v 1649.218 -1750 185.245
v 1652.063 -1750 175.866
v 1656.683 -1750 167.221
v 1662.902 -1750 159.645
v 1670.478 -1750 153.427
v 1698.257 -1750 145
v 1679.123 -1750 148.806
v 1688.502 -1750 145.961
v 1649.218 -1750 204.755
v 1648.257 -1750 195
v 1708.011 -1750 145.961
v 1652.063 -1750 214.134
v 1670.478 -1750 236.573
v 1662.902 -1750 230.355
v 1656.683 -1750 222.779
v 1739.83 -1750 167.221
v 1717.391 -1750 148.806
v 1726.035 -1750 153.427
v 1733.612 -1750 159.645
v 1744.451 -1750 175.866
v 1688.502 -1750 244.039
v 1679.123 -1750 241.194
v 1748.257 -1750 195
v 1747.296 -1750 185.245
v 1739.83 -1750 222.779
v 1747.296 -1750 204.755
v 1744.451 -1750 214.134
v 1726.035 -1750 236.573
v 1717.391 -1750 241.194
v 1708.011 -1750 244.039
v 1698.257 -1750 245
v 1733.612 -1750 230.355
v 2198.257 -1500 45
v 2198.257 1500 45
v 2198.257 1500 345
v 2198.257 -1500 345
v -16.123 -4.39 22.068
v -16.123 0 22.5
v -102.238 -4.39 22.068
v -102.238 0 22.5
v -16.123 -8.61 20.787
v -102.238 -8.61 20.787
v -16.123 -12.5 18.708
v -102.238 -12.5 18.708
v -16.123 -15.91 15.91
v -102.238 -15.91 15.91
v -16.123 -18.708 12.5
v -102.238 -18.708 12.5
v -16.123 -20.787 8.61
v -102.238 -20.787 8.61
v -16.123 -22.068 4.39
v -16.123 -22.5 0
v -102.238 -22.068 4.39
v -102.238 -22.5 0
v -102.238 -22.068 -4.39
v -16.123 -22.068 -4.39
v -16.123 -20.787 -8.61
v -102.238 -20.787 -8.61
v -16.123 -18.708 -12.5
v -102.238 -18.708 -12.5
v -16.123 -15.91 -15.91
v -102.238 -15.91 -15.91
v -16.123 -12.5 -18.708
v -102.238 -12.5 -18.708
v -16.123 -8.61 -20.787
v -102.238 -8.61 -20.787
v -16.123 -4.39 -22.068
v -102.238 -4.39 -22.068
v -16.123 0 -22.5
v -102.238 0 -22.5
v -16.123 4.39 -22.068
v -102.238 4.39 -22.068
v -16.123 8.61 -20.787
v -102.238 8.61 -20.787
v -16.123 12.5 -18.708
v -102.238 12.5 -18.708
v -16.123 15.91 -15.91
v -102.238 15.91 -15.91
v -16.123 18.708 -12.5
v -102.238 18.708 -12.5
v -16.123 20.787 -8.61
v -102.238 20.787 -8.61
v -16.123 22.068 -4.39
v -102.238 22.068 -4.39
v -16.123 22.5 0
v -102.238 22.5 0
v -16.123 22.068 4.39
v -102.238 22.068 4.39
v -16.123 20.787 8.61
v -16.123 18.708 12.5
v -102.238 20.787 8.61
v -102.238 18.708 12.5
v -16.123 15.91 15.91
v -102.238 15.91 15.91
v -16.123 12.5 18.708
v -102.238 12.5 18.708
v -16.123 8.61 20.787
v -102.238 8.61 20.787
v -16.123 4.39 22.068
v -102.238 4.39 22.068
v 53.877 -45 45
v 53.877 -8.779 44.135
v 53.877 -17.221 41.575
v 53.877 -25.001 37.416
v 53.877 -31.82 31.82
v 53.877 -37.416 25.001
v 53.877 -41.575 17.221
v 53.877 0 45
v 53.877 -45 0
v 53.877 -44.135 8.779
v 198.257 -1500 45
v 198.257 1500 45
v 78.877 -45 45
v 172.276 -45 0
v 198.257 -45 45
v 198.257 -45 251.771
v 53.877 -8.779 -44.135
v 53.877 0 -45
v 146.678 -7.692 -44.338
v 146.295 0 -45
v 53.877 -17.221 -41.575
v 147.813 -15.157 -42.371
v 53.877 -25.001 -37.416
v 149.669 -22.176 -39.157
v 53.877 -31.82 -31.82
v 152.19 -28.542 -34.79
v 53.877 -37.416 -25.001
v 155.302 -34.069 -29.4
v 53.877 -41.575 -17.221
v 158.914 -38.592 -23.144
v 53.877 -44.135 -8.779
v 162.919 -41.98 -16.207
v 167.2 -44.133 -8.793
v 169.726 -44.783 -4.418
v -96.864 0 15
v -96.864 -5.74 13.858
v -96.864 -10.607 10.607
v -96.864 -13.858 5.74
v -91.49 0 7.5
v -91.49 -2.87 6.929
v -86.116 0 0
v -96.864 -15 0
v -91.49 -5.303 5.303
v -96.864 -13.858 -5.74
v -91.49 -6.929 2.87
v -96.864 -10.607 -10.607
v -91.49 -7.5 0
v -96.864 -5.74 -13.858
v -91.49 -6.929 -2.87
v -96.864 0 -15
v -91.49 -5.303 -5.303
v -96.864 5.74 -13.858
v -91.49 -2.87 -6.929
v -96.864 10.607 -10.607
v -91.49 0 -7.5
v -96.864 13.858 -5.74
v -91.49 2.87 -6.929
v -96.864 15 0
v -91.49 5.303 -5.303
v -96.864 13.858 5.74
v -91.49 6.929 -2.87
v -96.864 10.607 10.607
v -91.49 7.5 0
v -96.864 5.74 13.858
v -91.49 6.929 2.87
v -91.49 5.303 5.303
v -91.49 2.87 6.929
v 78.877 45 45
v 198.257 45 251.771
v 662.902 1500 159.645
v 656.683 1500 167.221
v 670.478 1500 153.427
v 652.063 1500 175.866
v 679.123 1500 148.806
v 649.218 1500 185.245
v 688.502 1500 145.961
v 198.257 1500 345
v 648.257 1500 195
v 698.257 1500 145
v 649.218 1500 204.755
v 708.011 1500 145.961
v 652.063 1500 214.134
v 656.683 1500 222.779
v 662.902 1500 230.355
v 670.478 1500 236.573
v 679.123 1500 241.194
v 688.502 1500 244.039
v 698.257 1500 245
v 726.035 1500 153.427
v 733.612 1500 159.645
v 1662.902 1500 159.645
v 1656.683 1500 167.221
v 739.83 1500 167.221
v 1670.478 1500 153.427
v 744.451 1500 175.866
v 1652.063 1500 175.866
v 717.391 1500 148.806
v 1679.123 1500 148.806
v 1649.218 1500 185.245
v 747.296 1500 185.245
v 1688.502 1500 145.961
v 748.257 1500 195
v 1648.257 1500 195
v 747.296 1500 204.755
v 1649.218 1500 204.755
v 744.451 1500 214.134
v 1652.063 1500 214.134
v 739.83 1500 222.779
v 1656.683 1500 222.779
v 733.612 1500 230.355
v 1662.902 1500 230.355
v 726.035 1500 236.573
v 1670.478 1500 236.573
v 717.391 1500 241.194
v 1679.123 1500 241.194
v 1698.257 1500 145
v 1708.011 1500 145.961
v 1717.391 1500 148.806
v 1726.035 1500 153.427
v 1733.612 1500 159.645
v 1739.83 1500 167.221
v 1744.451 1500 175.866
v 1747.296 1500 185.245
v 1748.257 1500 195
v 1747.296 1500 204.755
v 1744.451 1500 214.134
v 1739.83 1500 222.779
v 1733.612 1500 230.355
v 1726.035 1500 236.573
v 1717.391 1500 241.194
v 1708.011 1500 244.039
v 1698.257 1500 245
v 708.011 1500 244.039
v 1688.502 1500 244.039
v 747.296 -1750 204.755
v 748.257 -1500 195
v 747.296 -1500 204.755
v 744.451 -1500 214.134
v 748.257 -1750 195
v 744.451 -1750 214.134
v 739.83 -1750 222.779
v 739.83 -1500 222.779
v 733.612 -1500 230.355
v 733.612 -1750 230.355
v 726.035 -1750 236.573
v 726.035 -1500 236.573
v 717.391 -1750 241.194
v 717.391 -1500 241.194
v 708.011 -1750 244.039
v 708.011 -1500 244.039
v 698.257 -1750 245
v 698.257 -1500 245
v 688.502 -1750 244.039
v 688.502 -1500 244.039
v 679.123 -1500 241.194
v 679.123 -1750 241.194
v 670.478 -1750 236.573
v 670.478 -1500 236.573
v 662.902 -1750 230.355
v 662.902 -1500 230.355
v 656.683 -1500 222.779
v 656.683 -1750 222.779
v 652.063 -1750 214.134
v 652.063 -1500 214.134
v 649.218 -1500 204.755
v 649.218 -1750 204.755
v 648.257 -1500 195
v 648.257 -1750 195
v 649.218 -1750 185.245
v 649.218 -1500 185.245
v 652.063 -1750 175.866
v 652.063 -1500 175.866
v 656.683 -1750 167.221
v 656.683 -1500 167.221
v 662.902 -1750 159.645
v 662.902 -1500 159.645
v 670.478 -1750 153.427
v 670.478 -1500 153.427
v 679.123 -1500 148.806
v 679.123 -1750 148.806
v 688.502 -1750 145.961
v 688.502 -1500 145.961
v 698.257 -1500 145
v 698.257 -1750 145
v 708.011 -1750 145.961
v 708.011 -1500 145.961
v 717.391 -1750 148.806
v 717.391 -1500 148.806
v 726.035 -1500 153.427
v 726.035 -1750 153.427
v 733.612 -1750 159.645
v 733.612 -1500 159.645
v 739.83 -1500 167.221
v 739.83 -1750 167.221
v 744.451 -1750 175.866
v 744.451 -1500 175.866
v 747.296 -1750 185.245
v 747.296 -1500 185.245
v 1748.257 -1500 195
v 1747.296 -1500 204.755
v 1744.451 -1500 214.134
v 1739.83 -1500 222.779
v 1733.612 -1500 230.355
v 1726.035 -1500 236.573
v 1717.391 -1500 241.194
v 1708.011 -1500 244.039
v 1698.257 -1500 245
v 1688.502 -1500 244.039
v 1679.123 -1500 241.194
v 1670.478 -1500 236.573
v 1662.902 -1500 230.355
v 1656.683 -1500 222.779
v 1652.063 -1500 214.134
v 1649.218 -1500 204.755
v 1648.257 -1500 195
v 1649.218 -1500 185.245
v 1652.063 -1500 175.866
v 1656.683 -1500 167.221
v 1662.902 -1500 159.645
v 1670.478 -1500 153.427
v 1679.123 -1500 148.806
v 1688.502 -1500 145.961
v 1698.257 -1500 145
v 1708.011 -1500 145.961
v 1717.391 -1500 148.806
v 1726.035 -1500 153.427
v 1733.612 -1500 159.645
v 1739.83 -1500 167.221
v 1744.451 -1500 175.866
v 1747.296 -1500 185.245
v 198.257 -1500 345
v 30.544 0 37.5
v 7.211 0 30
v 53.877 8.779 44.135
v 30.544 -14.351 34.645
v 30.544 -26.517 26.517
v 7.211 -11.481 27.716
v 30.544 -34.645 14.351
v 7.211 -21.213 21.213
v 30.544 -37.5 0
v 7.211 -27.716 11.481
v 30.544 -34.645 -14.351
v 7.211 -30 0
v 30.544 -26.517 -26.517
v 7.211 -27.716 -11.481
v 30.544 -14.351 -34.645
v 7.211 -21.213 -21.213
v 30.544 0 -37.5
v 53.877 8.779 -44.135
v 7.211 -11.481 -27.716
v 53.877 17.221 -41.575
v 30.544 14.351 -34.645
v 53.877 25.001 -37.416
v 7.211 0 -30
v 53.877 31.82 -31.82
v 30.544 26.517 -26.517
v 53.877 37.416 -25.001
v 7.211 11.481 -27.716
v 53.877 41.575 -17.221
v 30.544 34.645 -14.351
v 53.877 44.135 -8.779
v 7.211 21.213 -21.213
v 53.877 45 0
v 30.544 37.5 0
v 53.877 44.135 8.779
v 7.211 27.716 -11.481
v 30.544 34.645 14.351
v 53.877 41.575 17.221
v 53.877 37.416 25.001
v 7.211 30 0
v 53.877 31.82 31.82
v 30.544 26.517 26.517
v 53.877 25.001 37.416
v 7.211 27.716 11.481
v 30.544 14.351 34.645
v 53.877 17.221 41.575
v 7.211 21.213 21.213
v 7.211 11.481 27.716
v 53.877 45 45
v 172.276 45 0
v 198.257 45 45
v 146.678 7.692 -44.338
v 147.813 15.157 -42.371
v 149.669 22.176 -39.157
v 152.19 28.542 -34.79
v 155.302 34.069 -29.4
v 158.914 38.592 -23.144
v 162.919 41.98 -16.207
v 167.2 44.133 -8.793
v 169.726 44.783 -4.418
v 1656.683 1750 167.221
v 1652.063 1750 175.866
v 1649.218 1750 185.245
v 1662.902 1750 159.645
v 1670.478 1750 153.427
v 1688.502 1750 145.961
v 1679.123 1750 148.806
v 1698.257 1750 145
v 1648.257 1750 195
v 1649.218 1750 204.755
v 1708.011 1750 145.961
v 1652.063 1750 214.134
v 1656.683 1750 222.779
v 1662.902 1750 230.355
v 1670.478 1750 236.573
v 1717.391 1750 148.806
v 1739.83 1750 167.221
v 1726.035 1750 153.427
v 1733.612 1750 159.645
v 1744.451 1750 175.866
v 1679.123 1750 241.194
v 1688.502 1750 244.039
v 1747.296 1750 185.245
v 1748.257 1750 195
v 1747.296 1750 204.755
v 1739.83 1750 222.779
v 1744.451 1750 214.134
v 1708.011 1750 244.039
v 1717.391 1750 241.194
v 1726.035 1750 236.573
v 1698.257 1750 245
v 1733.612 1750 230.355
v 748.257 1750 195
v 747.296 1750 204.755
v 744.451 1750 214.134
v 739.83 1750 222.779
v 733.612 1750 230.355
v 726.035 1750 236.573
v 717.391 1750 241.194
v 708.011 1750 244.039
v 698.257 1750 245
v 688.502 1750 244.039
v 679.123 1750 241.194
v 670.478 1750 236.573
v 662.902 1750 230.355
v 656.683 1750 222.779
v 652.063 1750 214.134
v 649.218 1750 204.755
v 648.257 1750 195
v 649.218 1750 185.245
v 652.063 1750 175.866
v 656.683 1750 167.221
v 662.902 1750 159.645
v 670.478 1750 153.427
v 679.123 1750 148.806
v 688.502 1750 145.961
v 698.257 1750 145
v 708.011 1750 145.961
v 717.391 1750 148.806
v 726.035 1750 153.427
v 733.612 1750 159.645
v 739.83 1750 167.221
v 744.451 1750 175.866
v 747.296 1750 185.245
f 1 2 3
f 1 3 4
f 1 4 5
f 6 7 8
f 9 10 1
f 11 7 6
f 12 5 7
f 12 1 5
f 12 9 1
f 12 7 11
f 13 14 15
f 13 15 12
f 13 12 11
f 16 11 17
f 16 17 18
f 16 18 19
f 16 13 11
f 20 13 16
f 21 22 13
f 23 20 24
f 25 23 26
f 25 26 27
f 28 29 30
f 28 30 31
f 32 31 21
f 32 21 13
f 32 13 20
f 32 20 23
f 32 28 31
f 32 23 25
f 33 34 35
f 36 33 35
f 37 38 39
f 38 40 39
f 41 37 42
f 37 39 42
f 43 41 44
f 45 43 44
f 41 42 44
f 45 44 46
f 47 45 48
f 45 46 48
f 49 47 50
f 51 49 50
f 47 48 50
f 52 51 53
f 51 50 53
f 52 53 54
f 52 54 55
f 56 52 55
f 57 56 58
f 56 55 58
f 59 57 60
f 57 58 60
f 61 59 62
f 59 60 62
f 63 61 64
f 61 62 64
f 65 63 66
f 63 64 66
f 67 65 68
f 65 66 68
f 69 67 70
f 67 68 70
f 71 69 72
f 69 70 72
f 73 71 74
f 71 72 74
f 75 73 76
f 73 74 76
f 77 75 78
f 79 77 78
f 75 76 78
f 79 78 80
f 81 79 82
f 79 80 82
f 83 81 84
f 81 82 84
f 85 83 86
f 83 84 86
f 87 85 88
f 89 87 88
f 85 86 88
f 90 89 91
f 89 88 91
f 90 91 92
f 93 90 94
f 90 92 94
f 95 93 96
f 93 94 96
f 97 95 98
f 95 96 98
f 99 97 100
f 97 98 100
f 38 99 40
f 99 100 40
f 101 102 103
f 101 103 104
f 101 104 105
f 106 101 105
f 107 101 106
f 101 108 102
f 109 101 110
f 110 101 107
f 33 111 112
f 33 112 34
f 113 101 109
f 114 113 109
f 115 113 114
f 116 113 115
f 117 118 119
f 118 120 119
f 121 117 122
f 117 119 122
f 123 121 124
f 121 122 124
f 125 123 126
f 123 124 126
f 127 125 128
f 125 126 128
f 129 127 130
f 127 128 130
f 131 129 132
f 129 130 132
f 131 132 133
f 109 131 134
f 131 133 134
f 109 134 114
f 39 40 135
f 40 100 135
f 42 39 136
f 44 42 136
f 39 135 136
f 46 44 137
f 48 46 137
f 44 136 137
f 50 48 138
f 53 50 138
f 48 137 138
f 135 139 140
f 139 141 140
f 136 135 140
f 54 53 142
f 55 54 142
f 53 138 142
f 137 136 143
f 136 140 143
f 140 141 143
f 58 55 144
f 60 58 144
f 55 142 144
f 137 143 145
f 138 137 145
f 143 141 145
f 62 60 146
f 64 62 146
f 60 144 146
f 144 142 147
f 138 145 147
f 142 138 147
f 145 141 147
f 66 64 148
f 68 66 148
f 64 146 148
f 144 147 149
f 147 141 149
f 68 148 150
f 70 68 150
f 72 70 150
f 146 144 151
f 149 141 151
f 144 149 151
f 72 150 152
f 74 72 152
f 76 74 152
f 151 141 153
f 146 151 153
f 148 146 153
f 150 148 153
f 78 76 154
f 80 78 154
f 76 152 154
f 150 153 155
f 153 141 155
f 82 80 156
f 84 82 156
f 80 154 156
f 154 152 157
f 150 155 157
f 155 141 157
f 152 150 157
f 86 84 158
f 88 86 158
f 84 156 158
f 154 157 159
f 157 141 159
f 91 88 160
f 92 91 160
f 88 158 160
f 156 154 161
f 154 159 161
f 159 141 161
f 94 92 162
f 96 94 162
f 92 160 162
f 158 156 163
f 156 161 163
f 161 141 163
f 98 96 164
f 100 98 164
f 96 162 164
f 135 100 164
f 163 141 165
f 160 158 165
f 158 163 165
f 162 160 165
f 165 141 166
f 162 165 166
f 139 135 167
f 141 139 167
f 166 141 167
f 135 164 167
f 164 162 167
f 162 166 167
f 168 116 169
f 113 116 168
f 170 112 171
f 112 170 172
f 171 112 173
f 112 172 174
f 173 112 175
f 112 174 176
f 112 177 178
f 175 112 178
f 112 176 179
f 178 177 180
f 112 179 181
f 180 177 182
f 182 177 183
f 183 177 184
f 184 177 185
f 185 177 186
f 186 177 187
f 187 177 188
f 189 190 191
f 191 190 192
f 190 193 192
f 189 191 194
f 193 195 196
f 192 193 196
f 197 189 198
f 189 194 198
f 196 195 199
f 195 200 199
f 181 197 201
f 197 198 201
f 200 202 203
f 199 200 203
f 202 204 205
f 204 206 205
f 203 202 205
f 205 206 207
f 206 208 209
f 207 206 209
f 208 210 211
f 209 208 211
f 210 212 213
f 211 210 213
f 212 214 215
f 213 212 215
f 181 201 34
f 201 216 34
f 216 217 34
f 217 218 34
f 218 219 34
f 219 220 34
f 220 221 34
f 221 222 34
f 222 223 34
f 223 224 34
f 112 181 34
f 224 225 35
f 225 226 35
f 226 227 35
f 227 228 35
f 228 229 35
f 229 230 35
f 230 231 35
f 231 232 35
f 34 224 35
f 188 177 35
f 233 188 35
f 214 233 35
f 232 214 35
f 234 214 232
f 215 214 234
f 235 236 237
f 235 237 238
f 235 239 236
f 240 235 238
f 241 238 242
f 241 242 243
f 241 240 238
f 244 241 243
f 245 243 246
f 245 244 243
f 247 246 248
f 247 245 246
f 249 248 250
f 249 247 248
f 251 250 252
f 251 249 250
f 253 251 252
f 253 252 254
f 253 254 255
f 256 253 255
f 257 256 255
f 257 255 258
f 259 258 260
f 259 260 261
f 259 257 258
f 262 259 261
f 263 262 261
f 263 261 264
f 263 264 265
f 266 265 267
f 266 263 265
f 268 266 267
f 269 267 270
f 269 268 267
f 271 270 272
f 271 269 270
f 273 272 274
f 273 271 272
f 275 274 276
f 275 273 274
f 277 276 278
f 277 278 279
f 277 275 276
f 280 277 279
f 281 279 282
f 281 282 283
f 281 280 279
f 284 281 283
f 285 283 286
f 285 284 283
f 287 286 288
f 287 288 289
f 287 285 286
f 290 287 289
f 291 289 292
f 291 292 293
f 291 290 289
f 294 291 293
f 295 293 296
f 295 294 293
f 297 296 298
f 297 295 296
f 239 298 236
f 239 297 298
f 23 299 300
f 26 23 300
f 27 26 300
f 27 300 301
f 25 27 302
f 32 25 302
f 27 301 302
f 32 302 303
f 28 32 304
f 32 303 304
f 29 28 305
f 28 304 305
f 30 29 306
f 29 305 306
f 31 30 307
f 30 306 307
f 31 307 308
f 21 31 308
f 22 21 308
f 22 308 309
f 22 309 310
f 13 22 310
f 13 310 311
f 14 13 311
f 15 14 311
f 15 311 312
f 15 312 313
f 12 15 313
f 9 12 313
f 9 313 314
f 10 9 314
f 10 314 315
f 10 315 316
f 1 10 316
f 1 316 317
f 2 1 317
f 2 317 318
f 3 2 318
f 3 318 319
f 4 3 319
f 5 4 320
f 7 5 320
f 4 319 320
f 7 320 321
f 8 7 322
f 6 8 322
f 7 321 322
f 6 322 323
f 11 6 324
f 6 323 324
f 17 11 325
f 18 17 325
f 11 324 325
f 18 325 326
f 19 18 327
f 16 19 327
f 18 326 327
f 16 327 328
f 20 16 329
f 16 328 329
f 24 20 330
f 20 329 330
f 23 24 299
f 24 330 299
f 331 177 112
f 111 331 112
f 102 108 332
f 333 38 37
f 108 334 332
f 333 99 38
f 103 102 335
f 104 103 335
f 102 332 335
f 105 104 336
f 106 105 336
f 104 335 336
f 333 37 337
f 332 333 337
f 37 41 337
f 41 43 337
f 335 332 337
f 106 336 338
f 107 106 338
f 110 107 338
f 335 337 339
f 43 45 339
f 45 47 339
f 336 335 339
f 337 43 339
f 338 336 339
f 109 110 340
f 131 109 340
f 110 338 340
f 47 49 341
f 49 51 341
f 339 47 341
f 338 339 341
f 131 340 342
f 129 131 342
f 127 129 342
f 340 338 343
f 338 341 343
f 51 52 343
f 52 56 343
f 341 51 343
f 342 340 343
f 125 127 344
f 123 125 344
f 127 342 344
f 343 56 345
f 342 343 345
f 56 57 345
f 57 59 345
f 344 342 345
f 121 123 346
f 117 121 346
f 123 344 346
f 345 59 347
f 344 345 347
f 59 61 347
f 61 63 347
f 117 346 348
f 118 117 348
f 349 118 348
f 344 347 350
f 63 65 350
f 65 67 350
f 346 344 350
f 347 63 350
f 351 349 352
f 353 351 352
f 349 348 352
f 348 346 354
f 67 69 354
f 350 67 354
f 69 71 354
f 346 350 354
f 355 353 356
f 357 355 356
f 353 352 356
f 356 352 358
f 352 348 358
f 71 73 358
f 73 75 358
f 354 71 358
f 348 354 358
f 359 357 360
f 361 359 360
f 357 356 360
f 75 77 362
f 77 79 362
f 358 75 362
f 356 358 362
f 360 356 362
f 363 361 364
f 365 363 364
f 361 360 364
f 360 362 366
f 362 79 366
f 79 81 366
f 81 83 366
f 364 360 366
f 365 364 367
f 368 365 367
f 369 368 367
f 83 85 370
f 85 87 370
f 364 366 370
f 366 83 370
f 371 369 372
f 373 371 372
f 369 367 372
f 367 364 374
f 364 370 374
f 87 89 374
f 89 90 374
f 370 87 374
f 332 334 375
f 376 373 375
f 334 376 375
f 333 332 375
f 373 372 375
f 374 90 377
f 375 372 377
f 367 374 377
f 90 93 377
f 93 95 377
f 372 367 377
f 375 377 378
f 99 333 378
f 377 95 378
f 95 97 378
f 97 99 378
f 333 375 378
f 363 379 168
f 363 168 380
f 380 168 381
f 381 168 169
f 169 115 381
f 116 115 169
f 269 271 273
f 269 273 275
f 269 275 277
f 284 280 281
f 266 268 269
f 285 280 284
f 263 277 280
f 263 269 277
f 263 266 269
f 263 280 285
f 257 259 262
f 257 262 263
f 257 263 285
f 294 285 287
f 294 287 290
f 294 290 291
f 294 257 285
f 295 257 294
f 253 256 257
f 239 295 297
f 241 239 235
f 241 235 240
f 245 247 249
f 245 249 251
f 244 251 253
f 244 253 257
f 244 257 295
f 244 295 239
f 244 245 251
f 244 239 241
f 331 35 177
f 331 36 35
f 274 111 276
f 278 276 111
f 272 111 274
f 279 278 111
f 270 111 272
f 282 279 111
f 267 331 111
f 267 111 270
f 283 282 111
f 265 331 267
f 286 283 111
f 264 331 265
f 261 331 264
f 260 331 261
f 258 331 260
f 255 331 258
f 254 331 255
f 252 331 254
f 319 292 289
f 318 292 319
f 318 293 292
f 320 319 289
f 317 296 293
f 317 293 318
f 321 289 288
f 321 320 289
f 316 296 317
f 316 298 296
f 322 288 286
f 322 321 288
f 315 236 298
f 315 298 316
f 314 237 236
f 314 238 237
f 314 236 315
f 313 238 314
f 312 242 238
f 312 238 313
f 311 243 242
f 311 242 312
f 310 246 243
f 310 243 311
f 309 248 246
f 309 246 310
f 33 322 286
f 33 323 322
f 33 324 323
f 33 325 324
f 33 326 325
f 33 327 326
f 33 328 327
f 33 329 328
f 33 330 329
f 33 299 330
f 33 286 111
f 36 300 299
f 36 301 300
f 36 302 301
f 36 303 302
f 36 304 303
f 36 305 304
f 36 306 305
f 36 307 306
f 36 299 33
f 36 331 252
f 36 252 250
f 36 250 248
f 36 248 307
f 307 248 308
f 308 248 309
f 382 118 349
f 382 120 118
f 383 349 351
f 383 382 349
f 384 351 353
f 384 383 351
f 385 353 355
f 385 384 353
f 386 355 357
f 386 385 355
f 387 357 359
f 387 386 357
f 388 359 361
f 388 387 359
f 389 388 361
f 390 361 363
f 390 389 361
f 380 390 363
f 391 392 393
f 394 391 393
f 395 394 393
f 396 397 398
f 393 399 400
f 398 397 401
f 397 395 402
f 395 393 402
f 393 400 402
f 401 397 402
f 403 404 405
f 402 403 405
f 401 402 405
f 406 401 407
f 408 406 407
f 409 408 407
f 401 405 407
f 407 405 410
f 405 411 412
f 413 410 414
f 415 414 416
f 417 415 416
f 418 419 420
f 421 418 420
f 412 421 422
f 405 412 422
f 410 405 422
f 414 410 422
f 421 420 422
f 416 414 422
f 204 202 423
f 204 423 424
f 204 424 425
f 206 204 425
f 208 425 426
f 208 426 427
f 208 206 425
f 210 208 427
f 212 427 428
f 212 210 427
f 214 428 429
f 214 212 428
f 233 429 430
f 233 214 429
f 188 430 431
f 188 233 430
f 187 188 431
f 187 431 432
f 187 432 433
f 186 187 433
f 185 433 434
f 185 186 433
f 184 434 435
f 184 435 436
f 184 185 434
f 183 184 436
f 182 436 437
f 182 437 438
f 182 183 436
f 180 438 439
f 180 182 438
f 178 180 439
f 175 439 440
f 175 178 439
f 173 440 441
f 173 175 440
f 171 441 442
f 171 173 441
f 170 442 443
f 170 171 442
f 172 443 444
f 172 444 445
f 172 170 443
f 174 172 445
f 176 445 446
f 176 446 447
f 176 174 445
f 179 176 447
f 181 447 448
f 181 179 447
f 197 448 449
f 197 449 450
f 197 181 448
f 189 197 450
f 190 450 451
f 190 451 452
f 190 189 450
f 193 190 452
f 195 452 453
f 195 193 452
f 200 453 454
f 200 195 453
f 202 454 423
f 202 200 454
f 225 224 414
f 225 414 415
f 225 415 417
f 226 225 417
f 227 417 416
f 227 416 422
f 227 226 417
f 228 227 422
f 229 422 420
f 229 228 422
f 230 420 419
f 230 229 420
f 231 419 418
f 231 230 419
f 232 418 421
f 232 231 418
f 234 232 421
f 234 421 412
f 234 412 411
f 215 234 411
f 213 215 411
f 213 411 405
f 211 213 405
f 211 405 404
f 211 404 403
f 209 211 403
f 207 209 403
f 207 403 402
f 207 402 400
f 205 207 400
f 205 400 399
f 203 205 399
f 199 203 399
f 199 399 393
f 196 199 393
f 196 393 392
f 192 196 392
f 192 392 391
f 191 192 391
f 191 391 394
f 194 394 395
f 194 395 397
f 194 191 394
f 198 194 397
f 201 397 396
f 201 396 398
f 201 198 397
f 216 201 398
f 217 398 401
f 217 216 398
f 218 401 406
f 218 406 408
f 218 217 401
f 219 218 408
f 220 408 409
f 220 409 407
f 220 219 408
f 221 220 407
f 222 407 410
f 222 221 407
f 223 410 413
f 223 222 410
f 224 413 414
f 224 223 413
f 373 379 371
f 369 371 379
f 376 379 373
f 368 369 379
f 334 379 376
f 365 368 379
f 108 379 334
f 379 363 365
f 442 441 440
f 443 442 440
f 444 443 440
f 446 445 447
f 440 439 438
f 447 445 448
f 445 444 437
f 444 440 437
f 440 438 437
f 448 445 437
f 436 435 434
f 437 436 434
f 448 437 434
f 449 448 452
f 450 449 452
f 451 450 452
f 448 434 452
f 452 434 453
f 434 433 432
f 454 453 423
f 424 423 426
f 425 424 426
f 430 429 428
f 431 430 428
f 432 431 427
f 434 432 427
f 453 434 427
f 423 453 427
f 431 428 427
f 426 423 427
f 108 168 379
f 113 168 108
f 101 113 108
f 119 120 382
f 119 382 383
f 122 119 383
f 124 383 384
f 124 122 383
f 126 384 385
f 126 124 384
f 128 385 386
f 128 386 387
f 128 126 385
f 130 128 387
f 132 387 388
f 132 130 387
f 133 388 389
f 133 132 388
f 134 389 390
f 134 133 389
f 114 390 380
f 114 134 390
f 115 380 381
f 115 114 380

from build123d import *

# Parameters (mm, degrees)
F2_DEPTH = 45
F3_R     = 44.9999
F0_R     = 50
F4_DEPTH = 1500
F5_DEPTH = 1750


# Not quite as in the source:
# - a fillet or chamfer is up to 0.001 mm smaller than in the source, because OpenCascade refuses the exact size
# - a feature names something its author has since deleted; it is built from what else it names


with BuildPart() as f1:
    # F0 (on Front) → F1 (revolve)
    with BuildSketch(Plane.XZ):
        Polygon((53.877471291, 45), (-16.122528709, 22.5), (53.877471291, 22.5), align=None)
        Polygon((-16.122528709, 22.5), (0, 0), (53.877471291, 0), (53.877471291, 22.5), align=None)
        Polygon((-86.1157540445, 0), (0, 0), (-16.122528709, 22.5), (-102.2382827536, 22.5), align=None)
    revolve(axis=Axis((-43.0578770223, 0, 0), (1, 0, 0)))

    # F0 (on Front) → F2 (join, symmetric)
    with BuildSketch(Plane.XZ):
        Polygon((53.877471291, 22.5), (53.877471291, 0), (53.877471291, -45), (146.2954133749, -45), (198.256937602, 45), (198.256937602, 251.7713010311), (78.877471291, 45), (53.877471291, 45), align=None)
    extrude(amount=F2_DEPTH, both=True)

    # F3 (radius 45 in the source; OpenCascade refuses exactly that, so slightly less here)
    f3_edges = [f1.edges().sort_by_distance(p)[0] for p in [
        (100.086442, 45, -45),
        (100.086442, -45, -45),
    ]]
    fillet(f3_edges, radius=F3_R)


with BuildPart() as f4:
    # F0 (on Front) → F4 (new body, symmetric)
    with BuildSketch(Plane.XZ):
        Polygon((198.256937602, 345), (198.256937602, 251.7713010311), (198.256937602, 45), (2198.256937602, 45), (2198.256937602, 135), (2198.256937602, 345), align=None)
        with Locations((698.256937602, 195)):
            Circle(F0_R, mode=Mode.SUBTRACT)
        with Locations((1698.256937602, 195)):
            Circle(F0_R, mode=Mode.SUBTRACT)
    extrude(amount=F4_DEPTH, both=True)

    # F0 (on Front) → F5 (join, symmetric)
    with BuildSketch(Plane.XZ):
        with Locations((1698.256937602, 195)):
            Circle(F0_R)
        with Locations((698.256937602, 195)):
            Circle(F0_R)
    extrude(amount=F5_DEPTH, both=True)


solid = Compound([f1.part, f4.part])
